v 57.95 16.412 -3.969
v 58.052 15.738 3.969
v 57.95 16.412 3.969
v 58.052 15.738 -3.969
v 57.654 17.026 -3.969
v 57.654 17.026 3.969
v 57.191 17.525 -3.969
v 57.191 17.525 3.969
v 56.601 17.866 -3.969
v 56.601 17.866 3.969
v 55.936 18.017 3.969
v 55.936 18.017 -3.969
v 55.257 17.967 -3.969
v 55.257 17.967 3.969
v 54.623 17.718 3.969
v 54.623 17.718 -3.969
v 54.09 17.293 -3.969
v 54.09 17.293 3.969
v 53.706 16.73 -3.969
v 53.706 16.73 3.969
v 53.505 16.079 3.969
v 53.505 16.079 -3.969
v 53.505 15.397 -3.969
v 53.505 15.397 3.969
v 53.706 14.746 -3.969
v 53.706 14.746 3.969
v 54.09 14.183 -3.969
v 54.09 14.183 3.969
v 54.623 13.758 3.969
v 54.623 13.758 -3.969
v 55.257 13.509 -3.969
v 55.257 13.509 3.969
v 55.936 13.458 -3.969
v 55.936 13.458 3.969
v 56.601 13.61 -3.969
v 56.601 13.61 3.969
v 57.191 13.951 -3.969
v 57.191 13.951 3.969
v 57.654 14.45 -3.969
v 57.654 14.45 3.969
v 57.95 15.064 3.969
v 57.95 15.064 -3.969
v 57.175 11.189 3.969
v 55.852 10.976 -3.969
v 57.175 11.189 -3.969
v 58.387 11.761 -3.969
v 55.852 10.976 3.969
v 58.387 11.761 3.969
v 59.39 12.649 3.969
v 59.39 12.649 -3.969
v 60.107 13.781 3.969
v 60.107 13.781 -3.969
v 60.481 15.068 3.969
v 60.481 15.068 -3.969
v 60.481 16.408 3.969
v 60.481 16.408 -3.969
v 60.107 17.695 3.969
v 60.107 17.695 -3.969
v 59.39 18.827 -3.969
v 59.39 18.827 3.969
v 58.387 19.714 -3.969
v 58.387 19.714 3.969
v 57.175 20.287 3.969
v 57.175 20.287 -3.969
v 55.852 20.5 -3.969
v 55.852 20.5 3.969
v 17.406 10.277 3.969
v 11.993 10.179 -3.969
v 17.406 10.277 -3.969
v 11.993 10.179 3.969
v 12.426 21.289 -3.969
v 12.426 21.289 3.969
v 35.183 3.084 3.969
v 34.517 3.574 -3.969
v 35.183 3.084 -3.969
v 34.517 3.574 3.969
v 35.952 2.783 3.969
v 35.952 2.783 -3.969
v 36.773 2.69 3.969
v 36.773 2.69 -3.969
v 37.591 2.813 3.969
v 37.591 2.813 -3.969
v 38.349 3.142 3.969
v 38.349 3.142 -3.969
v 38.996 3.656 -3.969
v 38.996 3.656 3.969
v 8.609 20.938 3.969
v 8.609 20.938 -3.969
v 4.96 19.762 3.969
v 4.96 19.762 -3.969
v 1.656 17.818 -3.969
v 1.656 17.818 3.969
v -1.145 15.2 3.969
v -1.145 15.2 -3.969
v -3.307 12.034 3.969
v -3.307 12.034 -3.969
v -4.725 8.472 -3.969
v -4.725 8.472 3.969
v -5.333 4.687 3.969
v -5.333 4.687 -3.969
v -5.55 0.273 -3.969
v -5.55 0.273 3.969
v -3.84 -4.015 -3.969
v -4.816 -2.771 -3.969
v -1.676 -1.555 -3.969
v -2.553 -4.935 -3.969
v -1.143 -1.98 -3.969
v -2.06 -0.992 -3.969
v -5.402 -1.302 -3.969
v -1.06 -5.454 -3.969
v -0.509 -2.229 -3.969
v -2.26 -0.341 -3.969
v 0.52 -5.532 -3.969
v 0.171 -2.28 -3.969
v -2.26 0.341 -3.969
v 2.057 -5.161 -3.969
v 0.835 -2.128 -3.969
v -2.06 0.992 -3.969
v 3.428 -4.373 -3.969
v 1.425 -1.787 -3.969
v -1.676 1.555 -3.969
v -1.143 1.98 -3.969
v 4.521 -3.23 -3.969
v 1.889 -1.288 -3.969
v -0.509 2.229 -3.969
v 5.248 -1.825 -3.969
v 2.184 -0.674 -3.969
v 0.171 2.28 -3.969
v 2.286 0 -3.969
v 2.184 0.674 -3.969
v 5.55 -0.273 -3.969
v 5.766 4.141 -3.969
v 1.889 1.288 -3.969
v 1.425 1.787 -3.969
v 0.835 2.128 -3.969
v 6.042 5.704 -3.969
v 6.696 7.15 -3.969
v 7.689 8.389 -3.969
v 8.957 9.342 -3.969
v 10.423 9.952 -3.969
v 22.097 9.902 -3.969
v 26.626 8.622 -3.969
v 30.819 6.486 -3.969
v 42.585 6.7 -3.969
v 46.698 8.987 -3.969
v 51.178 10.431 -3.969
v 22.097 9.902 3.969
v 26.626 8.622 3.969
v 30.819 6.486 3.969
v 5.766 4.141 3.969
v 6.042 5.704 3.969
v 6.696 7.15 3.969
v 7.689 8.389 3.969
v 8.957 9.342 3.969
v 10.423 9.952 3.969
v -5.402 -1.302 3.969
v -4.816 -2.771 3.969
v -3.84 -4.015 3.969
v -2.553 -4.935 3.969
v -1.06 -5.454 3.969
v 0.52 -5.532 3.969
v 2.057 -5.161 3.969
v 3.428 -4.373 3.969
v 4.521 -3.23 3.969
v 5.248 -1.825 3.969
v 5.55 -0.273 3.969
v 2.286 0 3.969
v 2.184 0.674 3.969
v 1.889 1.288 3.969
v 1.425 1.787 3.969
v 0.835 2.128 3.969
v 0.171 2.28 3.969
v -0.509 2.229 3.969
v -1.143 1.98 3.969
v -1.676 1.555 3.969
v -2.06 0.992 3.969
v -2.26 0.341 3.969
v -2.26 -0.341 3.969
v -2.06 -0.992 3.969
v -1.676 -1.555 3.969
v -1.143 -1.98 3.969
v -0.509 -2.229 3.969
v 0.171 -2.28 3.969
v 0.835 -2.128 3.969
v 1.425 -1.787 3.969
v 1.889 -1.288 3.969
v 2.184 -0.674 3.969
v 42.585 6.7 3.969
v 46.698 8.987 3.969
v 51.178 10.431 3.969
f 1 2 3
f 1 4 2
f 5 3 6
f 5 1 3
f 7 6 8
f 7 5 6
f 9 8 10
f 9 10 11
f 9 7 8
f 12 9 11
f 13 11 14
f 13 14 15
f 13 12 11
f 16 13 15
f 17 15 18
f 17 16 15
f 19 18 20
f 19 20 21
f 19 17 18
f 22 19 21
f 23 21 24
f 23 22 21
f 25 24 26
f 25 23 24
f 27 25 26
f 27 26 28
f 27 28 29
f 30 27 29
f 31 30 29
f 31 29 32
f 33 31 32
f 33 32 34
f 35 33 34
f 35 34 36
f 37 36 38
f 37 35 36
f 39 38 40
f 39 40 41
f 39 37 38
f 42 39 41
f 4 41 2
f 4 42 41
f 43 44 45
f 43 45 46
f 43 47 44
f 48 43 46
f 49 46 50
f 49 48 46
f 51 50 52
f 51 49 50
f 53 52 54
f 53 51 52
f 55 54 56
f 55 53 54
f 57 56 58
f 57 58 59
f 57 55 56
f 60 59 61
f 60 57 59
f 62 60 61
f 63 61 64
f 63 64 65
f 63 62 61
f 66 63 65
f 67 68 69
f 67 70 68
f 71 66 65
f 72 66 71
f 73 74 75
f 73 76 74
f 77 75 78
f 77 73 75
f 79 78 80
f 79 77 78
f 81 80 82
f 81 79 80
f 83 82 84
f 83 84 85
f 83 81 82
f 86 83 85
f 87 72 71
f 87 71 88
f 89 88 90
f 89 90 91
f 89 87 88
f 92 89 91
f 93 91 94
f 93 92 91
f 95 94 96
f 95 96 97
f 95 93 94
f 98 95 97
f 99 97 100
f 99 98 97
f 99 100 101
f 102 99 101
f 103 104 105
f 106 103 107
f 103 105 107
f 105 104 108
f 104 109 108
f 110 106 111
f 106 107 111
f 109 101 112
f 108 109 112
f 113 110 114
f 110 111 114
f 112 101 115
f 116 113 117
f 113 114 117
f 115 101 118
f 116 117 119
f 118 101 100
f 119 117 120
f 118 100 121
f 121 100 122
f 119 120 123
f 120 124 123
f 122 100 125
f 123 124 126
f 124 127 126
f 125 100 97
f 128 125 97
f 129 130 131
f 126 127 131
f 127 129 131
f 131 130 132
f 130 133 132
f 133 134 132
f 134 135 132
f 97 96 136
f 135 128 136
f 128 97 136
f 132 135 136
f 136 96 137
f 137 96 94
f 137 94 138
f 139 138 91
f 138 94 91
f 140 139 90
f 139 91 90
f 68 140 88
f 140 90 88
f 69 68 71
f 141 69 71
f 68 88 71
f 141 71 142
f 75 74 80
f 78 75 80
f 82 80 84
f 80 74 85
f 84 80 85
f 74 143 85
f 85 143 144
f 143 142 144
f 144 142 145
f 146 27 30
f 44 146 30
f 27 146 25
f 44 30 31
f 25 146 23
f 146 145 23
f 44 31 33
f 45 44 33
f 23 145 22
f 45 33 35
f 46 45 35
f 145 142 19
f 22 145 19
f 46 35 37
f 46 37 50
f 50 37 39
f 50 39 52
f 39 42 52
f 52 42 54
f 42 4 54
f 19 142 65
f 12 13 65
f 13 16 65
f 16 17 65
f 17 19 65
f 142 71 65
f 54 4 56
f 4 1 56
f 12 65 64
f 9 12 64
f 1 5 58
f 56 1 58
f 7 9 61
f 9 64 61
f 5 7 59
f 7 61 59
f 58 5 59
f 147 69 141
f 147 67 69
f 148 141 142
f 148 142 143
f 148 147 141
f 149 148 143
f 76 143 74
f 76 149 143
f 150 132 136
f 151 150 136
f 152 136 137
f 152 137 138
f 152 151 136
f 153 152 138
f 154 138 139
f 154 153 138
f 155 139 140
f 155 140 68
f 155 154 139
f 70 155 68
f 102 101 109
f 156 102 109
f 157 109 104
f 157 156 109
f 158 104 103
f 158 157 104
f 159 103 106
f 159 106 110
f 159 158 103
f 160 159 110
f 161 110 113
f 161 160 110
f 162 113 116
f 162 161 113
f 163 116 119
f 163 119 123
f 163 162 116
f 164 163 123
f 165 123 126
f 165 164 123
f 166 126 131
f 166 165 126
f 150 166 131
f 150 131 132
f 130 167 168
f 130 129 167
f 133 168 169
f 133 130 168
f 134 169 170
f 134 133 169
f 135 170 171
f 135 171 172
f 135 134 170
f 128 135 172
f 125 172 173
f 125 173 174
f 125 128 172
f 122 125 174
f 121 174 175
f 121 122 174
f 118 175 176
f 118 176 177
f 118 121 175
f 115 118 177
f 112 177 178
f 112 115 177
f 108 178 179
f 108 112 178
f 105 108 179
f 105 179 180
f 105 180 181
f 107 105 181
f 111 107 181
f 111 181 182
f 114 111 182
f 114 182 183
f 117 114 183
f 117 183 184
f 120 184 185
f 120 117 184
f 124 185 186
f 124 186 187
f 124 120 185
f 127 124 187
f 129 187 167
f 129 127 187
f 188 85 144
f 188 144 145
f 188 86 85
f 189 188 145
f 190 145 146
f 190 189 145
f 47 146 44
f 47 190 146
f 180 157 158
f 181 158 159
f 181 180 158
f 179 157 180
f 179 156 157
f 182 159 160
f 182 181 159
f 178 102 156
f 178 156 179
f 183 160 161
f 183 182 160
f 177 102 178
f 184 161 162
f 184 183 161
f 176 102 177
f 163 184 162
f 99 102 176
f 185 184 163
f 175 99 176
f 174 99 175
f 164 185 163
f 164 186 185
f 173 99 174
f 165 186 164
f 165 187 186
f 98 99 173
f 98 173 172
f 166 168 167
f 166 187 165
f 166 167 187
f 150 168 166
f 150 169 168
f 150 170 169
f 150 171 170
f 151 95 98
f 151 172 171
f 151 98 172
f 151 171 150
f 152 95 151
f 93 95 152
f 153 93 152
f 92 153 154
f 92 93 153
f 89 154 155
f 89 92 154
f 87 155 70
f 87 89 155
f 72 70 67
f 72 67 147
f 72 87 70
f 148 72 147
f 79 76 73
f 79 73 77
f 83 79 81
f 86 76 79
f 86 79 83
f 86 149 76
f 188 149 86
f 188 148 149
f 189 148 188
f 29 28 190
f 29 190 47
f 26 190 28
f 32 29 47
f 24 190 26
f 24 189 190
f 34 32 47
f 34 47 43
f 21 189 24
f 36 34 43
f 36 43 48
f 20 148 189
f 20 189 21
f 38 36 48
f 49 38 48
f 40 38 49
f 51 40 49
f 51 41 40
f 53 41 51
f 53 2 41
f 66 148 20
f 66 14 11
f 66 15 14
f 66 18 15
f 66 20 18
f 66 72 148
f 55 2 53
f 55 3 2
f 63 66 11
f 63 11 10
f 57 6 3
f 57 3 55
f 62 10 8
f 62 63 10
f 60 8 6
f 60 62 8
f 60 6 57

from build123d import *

# Parameters (mm, degrees)
SKETCH1_R           = 2.286
BOSS_EXTRUDE1_DEPTH = 3.96875


with BuildPart() as part:
    # Sketch1 → Boss-Extrude1 (new, symmetric)
    with BuildSketch(Plane.XY):
        with BuildLine():
            Line((55.852160303, 20.499543888), (12.426339018, 21.289226167))
            ThreePointArc((12.426339018, 21.289226167), (0.183355577, 16.585853064), (-5.332604413, 4.686838505))
            Line((-5.332604413, 4.686838505), (-5.549551288, 0.272753664))
            ThreePointArc((-5.549551288, 0.272753664), (-0.272753664, -5.549551288), (5.549551288, -0.272753664))
            Line((5.549551288, -0.272753664), (5.766498164, 4.141331178))
            ThreePointArc((5.766498164, 4.141331178), (7.688680768, 8.388633469), (11.993389211, 10.178563055))
            Line((11.993389211, 10.178563055), (17.405800458, 10.276985724))
            ThreePointArc((17.405800458, 10.276985724), (26.626022332, 8.622204767), (34.517045693, 3.574181217))
            ThreePointArc((34.517045693, 3.574181217), (36.773296982, 2.690364107), (38.995923428, 3.65562793))
            ThreePointArc((38.995923428, 3.65562793), (46.698197557, 8.987209748), (55.852160303, 10.976118364))
            ThreePointArc((55.852160303, 10.976118364), (60.528070342, 15.737831126), (55.852160303, 20.499543888))
        make_face()
        Circle(SKETCH1_R, mode=Mode.SUBTRACT)
        with Locations((55.765570342, 15.737831126)):
            Circle(SKETCH1_R, mode=Mode.SUBTRACT)
    extrude(amount=BOSS_EXTRUDE1_DEPTH, both=True)


solid = part.part
